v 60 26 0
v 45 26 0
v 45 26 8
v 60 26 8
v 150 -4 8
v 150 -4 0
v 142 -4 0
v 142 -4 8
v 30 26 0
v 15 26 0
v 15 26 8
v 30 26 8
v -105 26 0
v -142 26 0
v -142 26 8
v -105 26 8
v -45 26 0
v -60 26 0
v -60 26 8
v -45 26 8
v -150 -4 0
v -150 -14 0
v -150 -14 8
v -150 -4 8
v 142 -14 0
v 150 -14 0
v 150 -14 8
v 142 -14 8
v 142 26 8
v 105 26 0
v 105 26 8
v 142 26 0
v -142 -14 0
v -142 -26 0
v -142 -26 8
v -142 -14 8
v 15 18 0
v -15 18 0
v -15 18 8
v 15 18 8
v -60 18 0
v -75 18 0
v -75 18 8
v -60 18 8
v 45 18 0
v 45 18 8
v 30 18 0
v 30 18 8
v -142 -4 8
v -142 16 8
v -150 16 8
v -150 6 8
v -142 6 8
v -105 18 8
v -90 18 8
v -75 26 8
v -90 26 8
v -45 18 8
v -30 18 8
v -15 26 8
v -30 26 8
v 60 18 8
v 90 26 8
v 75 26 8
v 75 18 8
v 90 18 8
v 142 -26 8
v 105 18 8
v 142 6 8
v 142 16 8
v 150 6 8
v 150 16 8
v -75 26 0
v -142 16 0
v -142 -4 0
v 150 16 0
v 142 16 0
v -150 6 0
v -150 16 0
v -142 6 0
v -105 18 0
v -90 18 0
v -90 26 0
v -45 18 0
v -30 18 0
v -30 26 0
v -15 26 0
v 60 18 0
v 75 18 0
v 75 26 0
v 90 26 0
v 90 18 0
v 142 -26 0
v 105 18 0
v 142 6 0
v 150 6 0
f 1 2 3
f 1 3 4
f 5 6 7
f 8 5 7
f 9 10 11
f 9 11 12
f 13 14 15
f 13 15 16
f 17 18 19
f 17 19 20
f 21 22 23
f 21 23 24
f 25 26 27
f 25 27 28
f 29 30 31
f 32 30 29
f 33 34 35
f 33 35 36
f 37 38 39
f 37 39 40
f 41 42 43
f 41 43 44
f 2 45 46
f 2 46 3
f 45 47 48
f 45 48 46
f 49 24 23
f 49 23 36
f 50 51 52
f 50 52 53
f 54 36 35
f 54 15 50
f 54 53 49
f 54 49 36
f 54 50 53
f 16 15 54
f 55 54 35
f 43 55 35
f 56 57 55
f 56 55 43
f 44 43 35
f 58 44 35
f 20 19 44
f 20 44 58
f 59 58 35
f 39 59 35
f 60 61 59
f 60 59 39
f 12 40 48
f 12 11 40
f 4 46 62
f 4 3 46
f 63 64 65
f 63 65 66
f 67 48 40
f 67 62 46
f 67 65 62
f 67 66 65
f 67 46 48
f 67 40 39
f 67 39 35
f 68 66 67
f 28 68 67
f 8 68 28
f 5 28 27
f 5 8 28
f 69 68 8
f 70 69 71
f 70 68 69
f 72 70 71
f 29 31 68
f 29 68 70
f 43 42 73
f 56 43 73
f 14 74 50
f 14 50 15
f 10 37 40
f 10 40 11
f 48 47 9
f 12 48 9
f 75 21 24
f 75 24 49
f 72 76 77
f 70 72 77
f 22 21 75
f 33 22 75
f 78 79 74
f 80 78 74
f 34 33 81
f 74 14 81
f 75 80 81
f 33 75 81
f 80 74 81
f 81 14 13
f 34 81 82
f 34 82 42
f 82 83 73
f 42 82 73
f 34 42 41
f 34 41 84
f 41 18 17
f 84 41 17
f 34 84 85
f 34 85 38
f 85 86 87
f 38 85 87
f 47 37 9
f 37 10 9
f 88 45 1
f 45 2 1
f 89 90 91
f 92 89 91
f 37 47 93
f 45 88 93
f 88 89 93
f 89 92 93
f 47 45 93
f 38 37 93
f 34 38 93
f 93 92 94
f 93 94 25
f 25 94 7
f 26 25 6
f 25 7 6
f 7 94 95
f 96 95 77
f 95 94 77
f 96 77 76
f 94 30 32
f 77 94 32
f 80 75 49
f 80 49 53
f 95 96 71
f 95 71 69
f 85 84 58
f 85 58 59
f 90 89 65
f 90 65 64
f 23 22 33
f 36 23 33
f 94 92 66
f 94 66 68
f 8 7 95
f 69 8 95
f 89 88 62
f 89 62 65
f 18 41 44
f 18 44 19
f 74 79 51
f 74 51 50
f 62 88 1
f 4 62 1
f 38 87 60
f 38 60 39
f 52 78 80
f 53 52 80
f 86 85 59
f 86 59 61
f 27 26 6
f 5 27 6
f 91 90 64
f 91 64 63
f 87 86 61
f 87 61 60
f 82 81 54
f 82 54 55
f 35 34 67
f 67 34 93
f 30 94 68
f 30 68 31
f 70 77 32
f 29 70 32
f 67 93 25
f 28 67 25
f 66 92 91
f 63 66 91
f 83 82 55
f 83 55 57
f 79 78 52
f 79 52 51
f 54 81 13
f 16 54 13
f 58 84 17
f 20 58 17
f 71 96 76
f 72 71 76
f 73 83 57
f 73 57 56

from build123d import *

# Parameters (mm, degrees)
ESQUISSE1_W             = 300
ESQUISSE1_H             = 52
BOSS_EXTRU_1_DEPTH      = 8
ESQUISSE2_W             = 8
ESQUISSE2_H             = 10
ENL_V_MAT_EXTRU_1_DEPTH = 153.446712001
ESQUISSE3_W             = 8
ESQUISSE3_H             = 2
ENL_V_MAT_EXTRU_2_DEPTH = 153.446712001
ESQUISSE4_W             = 15
ESQUISSE4_H             = 8
ENL_V_MAT_EXTRU_3_DEPTH = 10


with BuildPart() as part:
    # Esquisse1 → Boss.-Extru.1 (new body)
    with BuildSketch(Plane.XY):
        Rectangle(ESQUISSE1_W, ESQUISSE1_H)
    extrude(amount=BOSS_EXTRU_1_DEPTH)

    # Esquisse2 → Enlèv. mat.-Extru.1 (cut, through all)
    with BuildSketch(Plane.XY):
        with Locations((-146, 1)):
            Rectangle(ESQUISSE2_W, ESQUISSE2_H)
        with Locations((-146, 21)):
            Rectangle(ESQUISSE2_W, ESQUISSE2_H)
        with Locations((-146, -19)):
            Rectangle(ESQUISSE2_W, ESQUISSE2_H)
    enl_v_mat_extru_1 = extrude(amount=ENL_V_MAT_EXTRU_1_DEPTH, mode=Mode.SUBTRACT)

    # Esquisse3 → Enlèv. mat.-Extru.2 (cut, through all)
    with BuildSketch(Plane.XY):
        with Locations((-146, -25)):
            Rectangle(ESQUISSE3_W, ESQUISSE3_H)
    enl_v_mat_extru_2 = extrude(amount=ENL_V_MAT_EXTRU_2_DEPTH, mode=Mode.SUBTRACT)

    # Symétrie1: Enlèv. mat.-Extru.1, Enlèv. mat.-Extru.2 across plane
    add(enl_v_mat_extru_1.mirror(Plane(origin=(0, 0, 0), x_dir=(0, 0, 1), z_dir=(1, 0, 0))), mode=Mode.SUBTRACT)
    add(enl_v_mat_extru_2.mirror(Plane(origin=(0, 0, 0), x_dir=(0, 0, 1), z_dir=(1, 0, 0))), mode=Mode.SUBTRACT)

    # Esquisse4 → Enlèv. mat.-Extru.3 (cut)
    with BuildSketch(Plane.XY):
        with Locations((-97.5, 22)):
            Rectangle(ESQUISSE4_W, ESQUISSE4_H)
        with Locations((-37.5, 22)):
            Rectangle(ESQUISSE4_W, ESQUISSE4_H)
        with Locations((37.5, 22)):
            Rectangle(ESQUISSE4_W, ESQUISSE4_H)
        with Locations((67.5, 22)):
            Rectangle(ESQUISSE4_W, ESQUISSE4_H)
        with Locations((97.5, 22)):
            Rectangle(ESQUISSE4_W, ESQUISSE4_H)
        with Locations((-67.5, 22)):
            Rectangle(ESQUISSE4_W, ESQUISSE4_H)
        Polygon((0, 18), (15, 18), (15, 26), (0, 26), (-15, 26), (-15, 18), align=None)
    extrude(amount=ENL_V_MAT_EXTRU_3_DEPTH, mode=Mode.SUBTRACT)


solid = part.part
